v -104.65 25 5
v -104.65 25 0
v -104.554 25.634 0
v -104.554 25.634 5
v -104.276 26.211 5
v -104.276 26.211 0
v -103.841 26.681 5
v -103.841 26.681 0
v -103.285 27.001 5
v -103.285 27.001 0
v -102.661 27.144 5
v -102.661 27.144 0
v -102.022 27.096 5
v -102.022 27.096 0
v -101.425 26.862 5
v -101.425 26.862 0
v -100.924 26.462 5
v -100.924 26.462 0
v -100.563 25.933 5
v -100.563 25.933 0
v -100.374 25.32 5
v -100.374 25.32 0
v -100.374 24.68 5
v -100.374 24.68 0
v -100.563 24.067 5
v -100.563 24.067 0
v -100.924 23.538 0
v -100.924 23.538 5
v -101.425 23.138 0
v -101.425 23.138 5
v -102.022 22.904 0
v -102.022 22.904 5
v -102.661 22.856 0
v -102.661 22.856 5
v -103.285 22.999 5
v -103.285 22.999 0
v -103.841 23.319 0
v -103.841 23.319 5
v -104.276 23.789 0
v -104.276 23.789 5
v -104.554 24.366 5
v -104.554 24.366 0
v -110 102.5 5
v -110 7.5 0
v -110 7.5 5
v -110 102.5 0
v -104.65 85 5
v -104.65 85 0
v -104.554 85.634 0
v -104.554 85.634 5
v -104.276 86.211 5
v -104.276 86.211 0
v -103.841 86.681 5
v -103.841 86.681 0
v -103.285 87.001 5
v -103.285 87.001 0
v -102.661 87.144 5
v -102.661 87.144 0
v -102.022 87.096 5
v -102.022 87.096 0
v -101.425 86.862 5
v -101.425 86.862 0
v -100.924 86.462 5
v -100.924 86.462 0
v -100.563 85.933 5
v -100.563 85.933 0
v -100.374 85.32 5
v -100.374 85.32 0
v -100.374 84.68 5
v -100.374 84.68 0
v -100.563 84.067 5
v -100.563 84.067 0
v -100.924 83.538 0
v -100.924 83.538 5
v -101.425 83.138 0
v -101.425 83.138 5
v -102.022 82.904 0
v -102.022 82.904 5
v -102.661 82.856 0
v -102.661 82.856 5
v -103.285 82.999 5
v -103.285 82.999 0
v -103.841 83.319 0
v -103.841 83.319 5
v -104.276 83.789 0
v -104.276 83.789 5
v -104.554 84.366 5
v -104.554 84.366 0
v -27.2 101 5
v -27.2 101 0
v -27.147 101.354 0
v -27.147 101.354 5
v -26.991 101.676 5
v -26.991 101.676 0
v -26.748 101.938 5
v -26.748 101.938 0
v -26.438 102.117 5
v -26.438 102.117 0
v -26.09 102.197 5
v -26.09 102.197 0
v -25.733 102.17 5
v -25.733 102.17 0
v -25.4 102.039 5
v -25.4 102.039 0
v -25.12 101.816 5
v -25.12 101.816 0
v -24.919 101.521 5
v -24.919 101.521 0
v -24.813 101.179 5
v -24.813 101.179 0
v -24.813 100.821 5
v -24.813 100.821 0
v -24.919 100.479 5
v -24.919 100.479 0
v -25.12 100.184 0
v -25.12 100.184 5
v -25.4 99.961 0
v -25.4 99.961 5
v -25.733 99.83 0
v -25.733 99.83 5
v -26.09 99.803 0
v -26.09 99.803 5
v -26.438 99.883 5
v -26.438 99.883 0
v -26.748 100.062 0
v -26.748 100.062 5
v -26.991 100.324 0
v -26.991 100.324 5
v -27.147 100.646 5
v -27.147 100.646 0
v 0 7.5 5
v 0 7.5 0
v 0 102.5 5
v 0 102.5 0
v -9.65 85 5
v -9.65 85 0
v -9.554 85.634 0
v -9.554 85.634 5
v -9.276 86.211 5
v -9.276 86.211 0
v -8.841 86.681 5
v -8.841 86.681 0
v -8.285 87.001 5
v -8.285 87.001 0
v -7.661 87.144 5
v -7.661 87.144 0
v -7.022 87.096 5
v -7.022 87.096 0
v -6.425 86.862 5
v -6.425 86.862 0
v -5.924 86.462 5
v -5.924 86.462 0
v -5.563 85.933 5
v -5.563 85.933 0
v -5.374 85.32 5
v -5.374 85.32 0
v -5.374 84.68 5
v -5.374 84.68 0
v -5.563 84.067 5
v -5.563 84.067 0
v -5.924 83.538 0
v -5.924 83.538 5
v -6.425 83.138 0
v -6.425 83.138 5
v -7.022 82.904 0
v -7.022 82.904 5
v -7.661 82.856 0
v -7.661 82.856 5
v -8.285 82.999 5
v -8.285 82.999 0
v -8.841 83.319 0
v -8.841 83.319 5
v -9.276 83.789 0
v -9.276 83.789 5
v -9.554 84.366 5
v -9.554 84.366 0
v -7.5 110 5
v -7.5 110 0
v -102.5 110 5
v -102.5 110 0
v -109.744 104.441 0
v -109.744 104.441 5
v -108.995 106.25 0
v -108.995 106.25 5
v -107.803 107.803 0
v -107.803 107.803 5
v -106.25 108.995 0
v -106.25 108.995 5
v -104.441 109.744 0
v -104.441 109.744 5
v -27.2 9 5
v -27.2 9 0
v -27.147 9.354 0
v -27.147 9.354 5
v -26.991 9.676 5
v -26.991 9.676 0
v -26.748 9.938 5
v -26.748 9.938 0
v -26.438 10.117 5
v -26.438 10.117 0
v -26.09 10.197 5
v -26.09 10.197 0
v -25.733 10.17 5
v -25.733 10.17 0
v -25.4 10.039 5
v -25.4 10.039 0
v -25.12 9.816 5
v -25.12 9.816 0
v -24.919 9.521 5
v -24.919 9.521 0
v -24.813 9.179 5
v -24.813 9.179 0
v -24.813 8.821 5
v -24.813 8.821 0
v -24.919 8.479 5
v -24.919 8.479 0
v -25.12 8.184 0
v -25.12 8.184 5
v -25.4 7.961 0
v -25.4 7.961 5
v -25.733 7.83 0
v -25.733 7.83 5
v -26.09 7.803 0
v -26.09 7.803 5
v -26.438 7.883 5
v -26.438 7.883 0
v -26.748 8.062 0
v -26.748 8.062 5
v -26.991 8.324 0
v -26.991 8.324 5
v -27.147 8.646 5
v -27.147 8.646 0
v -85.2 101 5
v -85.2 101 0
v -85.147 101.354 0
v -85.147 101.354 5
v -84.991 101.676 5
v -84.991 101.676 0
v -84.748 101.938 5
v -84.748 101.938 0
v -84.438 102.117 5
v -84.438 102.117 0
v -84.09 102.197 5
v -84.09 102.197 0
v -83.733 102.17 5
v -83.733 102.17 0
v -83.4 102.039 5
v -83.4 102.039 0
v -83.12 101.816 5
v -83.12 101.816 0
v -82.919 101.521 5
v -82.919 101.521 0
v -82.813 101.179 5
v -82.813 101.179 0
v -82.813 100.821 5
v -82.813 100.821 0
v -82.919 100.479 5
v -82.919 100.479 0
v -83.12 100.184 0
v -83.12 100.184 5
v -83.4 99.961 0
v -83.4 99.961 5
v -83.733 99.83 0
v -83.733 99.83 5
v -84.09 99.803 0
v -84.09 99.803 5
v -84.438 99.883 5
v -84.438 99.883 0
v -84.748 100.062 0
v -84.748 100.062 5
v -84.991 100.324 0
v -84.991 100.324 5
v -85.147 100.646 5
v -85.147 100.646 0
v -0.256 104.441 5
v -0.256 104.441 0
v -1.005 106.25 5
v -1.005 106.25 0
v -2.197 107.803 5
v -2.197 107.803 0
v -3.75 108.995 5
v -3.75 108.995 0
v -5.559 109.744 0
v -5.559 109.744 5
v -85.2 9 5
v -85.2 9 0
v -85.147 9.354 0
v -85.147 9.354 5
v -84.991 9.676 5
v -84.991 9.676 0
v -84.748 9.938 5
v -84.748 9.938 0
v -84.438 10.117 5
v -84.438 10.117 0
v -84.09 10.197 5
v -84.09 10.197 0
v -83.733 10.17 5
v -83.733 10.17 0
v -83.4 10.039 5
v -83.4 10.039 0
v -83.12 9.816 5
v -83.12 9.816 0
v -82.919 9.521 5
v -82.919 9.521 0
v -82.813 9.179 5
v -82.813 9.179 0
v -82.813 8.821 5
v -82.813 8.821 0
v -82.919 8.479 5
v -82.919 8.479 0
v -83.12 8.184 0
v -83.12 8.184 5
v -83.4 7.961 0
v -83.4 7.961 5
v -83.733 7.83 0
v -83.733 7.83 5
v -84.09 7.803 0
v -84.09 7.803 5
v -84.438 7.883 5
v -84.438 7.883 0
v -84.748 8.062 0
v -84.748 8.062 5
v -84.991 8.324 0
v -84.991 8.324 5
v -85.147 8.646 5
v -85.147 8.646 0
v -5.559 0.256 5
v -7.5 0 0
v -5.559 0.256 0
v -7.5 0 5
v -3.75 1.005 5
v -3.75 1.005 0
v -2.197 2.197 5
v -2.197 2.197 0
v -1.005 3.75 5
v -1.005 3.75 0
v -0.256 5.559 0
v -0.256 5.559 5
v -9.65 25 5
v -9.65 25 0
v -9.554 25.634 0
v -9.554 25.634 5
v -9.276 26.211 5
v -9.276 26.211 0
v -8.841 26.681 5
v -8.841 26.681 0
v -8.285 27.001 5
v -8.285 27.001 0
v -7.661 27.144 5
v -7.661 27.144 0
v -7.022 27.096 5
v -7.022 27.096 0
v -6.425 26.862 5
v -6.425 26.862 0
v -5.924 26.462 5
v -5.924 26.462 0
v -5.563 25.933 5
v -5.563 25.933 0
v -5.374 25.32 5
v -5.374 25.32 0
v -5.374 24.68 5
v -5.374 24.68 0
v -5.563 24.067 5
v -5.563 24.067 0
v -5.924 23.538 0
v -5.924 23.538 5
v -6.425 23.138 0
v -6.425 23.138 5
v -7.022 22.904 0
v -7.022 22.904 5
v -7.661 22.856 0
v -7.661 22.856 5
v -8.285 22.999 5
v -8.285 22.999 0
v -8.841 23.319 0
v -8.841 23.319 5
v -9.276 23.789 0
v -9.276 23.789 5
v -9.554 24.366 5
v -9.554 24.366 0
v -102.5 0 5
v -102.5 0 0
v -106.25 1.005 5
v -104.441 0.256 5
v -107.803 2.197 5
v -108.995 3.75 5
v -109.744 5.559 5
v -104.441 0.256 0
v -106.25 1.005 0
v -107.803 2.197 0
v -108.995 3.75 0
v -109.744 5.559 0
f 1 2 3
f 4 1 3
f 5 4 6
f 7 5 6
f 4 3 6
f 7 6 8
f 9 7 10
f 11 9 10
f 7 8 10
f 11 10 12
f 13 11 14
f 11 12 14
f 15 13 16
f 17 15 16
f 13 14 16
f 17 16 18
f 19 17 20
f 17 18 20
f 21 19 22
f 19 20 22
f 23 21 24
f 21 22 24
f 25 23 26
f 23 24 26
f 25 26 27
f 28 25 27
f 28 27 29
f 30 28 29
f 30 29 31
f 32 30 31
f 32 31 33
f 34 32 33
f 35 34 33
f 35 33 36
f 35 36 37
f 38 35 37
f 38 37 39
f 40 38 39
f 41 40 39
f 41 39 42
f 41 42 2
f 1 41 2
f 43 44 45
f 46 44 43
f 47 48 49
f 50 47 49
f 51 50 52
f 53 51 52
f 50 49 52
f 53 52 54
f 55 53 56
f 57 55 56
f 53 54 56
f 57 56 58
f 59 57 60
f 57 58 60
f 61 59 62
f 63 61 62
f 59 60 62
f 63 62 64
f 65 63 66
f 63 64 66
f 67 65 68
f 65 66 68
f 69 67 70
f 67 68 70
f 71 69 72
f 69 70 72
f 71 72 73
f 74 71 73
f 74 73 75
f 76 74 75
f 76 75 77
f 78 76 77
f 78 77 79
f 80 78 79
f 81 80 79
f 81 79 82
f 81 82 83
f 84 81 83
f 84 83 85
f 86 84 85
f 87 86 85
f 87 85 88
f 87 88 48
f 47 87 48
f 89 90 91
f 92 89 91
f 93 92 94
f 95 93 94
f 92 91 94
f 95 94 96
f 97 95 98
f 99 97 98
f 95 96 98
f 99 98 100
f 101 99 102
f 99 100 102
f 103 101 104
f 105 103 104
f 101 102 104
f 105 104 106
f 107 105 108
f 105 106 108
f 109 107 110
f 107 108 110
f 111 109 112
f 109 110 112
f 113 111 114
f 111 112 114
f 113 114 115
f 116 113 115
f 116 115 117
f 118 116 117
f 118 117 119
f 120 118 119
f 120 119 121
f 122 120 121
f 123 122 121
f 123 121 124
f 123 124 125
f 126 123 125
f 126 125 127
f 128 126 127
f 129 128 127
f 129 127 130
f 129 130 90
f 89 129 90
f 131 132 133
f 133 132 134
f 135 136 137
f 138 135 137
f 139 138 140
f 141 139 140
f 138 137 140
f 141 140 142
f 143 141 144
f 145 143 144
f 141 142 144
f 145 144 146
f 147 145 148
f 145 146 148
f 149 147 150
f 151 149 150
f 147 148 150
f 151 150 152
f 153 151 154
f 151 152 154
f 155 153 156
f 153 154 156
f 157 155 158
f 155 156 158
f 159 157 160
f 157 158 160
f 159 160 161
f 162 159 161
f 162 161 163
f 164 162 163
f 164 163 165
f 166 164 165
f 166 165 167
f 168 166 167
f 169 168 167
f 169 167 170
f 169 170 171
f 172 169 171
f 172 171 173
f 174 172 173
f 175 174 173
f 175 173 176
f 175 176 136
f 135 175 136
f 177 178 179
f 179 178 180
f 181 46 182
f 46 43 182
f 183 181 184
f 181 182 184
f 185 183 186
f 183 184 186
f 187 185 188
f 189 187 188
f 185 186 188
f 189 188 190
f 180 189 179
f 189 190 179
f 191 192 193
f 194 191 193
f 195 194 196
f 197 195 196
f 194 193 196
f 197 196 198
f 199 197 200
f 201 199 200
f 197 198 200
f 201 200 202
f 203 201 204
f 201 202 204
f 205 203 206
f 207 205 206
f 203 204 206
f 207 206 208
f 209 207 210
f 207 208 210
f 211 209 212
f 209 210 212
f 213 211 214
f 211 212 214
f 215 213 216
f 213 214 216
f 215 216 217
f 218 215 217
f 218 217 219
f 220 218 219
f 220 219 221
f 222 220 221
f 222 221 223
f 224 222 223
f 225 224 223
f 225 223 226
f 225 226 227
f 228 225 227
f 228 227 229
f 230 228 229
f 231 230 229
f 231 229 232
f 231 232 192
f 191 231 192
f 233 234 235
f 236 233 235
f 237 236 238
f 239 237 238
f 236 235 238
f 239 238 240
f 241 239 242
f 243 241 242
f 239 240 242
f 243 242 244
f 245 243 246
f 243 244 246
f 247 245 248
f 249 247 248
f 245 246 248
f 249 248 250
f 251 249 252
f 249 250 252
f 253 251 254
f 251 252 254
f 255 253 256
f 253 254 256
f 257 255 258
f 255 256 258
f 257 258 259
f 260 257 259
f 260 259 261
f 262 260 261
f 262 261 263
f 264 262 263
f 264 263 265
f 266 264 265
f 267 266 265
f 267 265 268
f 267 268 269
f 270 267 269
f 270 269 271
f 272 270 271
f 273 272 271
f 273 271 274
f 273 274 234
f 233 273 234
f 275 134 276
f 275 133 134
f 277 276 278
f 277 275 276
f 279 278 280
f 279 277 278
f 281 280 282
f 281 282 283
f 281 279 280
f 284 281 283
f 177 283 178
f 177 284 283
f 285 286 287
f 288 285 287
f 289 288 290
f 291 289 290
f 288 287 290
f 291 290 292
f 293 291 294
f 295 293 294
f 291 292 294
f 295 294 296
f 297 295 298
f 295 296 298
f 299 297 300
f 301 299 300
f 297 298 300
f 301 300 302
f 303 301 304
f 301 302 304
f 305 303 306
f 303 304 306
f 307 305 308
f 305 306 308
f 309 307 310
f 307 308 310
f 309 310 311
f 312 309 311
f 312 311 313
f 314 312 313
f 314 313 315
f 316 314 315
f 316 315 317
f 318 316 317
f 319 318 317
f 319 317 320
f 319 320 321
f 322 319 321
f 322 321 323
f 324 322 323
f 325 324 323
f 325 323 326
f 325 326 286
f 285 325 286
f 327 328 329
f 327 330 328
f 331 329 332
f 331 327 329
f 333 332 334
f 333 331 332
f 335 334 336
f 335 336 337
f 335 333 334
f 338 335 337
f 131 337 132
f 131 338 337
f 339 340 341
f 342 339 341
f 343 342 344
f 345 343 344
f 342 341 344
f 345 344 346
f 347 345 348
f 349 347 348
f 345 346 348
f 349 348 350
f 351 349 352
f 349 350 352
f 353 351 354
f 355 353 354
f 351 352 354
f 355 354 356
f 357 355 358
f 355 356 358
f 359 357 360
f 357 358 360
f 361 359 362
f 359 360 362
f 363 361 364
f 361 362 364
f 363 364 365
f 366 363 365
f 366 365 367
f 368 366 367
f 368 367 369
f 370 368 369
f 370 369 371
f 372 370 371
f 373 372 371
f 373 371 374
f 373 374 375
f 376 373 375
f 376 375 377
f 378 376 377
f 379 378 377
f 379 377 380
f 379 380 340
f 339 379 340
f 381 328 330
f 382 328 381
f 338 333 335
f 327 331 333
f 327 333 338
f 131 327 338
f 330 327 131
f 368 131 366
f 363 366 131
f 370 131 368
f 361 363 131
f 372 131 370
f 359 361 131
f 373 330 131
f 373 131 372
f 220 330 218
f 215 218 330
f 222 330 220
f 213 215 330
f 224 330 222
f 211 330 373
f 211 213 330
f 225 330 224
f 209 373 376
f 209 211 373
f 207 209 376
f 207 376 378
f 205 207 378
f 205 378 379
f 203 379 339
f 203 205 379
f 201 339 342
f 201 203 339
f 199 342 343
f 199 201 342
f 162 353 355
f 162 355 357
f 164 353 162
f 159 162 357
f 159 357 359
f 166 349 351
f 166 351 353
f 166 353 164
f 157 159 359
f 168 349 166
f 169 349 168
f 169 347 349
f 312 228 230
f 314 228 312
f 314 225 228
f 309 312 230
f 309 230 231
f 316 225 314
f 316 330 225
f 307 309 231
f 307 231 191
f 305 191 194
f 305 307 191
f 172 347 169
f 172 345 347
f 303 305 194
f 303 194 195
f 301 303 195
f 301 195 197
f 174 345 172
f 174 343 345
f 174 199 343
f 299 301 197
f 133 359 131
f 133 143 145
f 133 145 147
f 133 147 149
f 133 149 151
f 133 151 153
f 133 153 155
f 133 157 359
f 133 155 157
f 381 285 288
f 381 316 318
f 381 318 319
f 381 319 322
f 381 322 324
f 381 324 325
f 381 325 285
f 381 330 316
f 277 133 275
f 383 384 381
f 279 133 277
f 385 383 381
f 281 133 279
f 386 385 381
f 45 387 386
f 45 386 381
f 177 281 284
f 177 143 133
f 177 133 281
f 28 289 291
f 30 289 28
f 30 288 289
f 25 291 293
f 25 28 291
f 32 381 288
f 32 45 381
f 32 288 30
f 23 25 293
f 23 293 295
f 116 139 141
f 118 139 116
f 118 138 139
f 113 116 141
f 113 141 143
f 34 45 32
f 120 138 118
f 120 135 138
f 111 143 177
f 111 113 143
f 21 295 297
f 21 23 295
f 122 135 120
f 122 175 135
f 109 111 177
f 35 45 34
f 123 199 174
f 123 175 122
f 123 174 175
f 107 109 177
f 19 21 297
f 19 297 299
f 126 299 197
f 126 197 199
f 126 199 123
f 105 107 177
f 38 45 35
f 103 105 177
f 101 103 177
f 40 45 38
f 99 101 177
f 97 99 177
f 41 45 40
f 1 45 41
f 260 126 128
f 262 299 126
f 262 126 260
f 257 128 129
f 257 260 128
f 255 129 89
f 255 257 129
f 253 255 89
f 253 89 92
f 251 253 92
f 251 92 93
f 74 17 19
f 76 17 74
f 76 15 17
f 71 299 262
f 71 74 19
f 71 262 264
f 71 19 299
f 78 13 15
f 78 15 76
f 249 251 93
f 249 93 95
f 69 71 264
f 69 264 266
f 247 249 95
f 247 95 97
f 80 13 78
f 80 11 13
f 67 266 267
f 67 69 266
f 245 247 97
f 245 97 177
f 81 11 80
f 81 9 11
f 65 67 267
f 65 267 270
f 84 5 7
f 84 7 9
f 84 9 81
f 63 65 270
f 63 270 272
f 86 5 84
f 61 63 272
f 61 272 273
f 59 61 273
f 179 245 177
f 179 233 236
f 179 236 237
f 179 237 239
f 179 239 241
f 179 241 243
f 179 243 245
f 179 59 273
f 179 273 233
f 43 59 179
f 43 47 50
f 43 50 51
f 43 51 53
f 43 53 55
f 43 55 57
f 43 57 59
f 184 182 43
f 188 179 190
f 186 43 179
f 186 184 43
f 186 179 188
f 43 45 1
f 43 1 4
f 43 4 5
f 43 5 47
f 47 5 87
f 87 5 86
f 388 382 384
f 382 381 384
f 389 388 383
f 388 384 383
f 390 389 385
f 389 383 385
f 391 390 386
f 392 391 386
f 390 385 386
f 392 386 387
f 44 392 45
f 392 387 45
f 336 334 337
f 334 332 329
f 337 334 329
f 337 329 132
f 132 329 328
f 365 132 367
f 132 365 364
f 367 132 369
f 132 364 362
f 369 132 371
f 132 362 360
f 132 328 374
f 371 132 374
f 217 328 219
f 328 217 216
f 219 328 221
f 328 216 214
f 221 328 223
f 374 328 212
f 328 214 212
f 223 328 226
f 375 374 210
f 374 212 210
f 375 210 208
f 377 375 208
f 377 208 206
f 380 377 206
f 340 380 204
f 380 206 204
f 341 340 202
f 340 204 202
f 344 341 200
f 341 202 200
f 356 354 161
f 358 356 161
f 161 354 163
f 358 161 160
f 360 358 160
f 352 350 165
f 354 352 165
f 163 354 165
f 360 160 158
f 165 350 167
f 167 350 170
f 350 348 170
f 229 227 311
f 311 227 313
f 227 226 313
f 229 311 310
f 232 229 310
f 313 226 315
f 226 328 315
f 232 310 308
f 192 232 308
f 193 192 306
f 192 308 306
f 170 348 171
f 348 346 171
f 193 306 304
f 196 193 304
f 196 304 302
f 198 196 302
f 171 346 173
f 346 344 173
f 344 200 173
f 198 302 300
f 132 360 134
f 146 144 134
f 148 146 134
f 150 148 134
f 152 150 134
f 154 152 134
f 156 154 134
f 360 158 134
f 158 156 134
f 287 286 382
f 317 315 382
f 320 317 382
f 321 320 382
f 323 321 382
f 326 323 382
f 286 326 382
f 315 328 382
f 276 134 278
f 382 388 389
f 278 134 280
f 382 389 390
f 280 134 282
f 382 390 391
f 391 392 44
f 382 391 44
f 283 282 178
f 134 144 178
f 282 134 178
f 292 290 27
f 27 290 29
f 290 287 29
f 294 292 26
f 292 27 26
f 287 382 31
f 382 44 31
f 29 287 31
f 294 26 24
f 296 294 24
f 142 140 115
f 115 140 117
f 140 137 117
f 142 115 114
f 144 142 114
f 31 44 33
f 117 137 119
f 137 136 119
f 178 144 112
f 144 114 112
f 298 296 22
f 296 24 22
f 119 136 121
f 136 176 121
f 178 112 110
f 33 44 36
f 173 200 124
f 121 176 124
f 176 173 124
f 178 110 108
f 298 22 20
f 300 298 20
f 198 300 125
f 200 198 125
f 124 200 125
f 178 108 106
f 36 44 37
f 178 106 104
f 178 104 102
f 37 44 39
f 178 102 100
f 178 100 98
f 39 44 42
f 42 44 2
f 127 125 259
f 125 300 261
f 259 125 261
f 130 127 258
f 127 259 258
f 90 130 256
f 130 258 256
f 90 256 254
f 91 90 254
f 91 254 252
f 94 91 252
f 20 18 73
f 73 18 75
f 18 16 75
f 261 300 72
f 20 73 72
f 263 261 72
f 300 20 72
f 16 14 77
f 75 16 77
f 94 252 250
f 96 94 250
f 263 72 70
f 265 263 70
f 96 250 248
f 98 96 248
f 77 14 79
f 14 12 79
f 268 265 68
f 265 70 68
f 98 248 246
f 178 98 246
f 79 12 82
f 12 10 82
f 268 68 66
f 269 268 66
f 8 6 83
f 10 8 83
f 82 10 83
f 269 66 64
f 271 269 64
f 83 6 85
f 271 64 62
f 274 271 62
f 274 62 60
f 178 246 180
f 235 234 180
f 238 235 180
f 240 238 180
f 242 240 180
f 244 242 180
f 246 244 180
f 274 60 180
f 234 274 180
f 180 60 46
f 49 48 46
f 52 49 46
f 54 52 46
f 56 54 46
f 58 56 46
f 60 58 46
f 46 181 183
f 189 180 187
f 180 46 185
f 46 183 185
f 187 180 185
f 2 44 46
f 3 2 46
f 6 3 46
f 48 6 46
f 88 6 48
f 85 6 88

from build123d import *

# Parameters (mm, degrees)
SKETCH_1_W         = 110
SKETCH_1_H         = 110
EXTRUDE_1_DEPTH    = 5
HOLE_WIZARD_M2_1_D = 2.4
HOLE_WIZARD_M4_1_D = 4.3
FILLET_1_R         = 7.5


with BuildPart() as part:
    # ｽｹｯﾁ1 → ﾎﾞｽ - 押し出し1 (new body)
    with BuildSketch(Plane(origin=(0, 0, 0), x_dir=(0, 1, 0), z_dir=(0, 0, 1))):
        with Locations((55, 55)):
            Rectangle(SKETCH_1_W, SKETCH_1_H)
    extrude(amount=EXTRUDE_1_DEPTH)

    # M2 すきま穴1 (through all)
    with Locations(Plane.XY.offset(5)):
        with Locations((-84, 9), (-84, 101), (-26, 101), (-26, 9)):
            Hole(HOLE_WIZARD_M2_1_D / 2)

    # M4 すきま穴1 (through all)
    with Locations(Plane.XY.offset(5)):
        with Locations((-102.5, 85), (-102.5, 25), (-7.5, 25), (-7.5, 85)):
            Hole(HOLE_WIZARD_M4_1_D / 2)

    # ﾌｨﾚｯﾄ1
    fillet_1_edges = [part.edges().sort_by_distance(p)[0] for p in [
        (-110, 0, 2.5),
        (-110, 110, 2.5),
        (0, 110, 2.5),
        (0, 0, 2.5),
    ]]
    fillet(fillet_1_edges, radius=FILLET_1_R)


solid = part.part
